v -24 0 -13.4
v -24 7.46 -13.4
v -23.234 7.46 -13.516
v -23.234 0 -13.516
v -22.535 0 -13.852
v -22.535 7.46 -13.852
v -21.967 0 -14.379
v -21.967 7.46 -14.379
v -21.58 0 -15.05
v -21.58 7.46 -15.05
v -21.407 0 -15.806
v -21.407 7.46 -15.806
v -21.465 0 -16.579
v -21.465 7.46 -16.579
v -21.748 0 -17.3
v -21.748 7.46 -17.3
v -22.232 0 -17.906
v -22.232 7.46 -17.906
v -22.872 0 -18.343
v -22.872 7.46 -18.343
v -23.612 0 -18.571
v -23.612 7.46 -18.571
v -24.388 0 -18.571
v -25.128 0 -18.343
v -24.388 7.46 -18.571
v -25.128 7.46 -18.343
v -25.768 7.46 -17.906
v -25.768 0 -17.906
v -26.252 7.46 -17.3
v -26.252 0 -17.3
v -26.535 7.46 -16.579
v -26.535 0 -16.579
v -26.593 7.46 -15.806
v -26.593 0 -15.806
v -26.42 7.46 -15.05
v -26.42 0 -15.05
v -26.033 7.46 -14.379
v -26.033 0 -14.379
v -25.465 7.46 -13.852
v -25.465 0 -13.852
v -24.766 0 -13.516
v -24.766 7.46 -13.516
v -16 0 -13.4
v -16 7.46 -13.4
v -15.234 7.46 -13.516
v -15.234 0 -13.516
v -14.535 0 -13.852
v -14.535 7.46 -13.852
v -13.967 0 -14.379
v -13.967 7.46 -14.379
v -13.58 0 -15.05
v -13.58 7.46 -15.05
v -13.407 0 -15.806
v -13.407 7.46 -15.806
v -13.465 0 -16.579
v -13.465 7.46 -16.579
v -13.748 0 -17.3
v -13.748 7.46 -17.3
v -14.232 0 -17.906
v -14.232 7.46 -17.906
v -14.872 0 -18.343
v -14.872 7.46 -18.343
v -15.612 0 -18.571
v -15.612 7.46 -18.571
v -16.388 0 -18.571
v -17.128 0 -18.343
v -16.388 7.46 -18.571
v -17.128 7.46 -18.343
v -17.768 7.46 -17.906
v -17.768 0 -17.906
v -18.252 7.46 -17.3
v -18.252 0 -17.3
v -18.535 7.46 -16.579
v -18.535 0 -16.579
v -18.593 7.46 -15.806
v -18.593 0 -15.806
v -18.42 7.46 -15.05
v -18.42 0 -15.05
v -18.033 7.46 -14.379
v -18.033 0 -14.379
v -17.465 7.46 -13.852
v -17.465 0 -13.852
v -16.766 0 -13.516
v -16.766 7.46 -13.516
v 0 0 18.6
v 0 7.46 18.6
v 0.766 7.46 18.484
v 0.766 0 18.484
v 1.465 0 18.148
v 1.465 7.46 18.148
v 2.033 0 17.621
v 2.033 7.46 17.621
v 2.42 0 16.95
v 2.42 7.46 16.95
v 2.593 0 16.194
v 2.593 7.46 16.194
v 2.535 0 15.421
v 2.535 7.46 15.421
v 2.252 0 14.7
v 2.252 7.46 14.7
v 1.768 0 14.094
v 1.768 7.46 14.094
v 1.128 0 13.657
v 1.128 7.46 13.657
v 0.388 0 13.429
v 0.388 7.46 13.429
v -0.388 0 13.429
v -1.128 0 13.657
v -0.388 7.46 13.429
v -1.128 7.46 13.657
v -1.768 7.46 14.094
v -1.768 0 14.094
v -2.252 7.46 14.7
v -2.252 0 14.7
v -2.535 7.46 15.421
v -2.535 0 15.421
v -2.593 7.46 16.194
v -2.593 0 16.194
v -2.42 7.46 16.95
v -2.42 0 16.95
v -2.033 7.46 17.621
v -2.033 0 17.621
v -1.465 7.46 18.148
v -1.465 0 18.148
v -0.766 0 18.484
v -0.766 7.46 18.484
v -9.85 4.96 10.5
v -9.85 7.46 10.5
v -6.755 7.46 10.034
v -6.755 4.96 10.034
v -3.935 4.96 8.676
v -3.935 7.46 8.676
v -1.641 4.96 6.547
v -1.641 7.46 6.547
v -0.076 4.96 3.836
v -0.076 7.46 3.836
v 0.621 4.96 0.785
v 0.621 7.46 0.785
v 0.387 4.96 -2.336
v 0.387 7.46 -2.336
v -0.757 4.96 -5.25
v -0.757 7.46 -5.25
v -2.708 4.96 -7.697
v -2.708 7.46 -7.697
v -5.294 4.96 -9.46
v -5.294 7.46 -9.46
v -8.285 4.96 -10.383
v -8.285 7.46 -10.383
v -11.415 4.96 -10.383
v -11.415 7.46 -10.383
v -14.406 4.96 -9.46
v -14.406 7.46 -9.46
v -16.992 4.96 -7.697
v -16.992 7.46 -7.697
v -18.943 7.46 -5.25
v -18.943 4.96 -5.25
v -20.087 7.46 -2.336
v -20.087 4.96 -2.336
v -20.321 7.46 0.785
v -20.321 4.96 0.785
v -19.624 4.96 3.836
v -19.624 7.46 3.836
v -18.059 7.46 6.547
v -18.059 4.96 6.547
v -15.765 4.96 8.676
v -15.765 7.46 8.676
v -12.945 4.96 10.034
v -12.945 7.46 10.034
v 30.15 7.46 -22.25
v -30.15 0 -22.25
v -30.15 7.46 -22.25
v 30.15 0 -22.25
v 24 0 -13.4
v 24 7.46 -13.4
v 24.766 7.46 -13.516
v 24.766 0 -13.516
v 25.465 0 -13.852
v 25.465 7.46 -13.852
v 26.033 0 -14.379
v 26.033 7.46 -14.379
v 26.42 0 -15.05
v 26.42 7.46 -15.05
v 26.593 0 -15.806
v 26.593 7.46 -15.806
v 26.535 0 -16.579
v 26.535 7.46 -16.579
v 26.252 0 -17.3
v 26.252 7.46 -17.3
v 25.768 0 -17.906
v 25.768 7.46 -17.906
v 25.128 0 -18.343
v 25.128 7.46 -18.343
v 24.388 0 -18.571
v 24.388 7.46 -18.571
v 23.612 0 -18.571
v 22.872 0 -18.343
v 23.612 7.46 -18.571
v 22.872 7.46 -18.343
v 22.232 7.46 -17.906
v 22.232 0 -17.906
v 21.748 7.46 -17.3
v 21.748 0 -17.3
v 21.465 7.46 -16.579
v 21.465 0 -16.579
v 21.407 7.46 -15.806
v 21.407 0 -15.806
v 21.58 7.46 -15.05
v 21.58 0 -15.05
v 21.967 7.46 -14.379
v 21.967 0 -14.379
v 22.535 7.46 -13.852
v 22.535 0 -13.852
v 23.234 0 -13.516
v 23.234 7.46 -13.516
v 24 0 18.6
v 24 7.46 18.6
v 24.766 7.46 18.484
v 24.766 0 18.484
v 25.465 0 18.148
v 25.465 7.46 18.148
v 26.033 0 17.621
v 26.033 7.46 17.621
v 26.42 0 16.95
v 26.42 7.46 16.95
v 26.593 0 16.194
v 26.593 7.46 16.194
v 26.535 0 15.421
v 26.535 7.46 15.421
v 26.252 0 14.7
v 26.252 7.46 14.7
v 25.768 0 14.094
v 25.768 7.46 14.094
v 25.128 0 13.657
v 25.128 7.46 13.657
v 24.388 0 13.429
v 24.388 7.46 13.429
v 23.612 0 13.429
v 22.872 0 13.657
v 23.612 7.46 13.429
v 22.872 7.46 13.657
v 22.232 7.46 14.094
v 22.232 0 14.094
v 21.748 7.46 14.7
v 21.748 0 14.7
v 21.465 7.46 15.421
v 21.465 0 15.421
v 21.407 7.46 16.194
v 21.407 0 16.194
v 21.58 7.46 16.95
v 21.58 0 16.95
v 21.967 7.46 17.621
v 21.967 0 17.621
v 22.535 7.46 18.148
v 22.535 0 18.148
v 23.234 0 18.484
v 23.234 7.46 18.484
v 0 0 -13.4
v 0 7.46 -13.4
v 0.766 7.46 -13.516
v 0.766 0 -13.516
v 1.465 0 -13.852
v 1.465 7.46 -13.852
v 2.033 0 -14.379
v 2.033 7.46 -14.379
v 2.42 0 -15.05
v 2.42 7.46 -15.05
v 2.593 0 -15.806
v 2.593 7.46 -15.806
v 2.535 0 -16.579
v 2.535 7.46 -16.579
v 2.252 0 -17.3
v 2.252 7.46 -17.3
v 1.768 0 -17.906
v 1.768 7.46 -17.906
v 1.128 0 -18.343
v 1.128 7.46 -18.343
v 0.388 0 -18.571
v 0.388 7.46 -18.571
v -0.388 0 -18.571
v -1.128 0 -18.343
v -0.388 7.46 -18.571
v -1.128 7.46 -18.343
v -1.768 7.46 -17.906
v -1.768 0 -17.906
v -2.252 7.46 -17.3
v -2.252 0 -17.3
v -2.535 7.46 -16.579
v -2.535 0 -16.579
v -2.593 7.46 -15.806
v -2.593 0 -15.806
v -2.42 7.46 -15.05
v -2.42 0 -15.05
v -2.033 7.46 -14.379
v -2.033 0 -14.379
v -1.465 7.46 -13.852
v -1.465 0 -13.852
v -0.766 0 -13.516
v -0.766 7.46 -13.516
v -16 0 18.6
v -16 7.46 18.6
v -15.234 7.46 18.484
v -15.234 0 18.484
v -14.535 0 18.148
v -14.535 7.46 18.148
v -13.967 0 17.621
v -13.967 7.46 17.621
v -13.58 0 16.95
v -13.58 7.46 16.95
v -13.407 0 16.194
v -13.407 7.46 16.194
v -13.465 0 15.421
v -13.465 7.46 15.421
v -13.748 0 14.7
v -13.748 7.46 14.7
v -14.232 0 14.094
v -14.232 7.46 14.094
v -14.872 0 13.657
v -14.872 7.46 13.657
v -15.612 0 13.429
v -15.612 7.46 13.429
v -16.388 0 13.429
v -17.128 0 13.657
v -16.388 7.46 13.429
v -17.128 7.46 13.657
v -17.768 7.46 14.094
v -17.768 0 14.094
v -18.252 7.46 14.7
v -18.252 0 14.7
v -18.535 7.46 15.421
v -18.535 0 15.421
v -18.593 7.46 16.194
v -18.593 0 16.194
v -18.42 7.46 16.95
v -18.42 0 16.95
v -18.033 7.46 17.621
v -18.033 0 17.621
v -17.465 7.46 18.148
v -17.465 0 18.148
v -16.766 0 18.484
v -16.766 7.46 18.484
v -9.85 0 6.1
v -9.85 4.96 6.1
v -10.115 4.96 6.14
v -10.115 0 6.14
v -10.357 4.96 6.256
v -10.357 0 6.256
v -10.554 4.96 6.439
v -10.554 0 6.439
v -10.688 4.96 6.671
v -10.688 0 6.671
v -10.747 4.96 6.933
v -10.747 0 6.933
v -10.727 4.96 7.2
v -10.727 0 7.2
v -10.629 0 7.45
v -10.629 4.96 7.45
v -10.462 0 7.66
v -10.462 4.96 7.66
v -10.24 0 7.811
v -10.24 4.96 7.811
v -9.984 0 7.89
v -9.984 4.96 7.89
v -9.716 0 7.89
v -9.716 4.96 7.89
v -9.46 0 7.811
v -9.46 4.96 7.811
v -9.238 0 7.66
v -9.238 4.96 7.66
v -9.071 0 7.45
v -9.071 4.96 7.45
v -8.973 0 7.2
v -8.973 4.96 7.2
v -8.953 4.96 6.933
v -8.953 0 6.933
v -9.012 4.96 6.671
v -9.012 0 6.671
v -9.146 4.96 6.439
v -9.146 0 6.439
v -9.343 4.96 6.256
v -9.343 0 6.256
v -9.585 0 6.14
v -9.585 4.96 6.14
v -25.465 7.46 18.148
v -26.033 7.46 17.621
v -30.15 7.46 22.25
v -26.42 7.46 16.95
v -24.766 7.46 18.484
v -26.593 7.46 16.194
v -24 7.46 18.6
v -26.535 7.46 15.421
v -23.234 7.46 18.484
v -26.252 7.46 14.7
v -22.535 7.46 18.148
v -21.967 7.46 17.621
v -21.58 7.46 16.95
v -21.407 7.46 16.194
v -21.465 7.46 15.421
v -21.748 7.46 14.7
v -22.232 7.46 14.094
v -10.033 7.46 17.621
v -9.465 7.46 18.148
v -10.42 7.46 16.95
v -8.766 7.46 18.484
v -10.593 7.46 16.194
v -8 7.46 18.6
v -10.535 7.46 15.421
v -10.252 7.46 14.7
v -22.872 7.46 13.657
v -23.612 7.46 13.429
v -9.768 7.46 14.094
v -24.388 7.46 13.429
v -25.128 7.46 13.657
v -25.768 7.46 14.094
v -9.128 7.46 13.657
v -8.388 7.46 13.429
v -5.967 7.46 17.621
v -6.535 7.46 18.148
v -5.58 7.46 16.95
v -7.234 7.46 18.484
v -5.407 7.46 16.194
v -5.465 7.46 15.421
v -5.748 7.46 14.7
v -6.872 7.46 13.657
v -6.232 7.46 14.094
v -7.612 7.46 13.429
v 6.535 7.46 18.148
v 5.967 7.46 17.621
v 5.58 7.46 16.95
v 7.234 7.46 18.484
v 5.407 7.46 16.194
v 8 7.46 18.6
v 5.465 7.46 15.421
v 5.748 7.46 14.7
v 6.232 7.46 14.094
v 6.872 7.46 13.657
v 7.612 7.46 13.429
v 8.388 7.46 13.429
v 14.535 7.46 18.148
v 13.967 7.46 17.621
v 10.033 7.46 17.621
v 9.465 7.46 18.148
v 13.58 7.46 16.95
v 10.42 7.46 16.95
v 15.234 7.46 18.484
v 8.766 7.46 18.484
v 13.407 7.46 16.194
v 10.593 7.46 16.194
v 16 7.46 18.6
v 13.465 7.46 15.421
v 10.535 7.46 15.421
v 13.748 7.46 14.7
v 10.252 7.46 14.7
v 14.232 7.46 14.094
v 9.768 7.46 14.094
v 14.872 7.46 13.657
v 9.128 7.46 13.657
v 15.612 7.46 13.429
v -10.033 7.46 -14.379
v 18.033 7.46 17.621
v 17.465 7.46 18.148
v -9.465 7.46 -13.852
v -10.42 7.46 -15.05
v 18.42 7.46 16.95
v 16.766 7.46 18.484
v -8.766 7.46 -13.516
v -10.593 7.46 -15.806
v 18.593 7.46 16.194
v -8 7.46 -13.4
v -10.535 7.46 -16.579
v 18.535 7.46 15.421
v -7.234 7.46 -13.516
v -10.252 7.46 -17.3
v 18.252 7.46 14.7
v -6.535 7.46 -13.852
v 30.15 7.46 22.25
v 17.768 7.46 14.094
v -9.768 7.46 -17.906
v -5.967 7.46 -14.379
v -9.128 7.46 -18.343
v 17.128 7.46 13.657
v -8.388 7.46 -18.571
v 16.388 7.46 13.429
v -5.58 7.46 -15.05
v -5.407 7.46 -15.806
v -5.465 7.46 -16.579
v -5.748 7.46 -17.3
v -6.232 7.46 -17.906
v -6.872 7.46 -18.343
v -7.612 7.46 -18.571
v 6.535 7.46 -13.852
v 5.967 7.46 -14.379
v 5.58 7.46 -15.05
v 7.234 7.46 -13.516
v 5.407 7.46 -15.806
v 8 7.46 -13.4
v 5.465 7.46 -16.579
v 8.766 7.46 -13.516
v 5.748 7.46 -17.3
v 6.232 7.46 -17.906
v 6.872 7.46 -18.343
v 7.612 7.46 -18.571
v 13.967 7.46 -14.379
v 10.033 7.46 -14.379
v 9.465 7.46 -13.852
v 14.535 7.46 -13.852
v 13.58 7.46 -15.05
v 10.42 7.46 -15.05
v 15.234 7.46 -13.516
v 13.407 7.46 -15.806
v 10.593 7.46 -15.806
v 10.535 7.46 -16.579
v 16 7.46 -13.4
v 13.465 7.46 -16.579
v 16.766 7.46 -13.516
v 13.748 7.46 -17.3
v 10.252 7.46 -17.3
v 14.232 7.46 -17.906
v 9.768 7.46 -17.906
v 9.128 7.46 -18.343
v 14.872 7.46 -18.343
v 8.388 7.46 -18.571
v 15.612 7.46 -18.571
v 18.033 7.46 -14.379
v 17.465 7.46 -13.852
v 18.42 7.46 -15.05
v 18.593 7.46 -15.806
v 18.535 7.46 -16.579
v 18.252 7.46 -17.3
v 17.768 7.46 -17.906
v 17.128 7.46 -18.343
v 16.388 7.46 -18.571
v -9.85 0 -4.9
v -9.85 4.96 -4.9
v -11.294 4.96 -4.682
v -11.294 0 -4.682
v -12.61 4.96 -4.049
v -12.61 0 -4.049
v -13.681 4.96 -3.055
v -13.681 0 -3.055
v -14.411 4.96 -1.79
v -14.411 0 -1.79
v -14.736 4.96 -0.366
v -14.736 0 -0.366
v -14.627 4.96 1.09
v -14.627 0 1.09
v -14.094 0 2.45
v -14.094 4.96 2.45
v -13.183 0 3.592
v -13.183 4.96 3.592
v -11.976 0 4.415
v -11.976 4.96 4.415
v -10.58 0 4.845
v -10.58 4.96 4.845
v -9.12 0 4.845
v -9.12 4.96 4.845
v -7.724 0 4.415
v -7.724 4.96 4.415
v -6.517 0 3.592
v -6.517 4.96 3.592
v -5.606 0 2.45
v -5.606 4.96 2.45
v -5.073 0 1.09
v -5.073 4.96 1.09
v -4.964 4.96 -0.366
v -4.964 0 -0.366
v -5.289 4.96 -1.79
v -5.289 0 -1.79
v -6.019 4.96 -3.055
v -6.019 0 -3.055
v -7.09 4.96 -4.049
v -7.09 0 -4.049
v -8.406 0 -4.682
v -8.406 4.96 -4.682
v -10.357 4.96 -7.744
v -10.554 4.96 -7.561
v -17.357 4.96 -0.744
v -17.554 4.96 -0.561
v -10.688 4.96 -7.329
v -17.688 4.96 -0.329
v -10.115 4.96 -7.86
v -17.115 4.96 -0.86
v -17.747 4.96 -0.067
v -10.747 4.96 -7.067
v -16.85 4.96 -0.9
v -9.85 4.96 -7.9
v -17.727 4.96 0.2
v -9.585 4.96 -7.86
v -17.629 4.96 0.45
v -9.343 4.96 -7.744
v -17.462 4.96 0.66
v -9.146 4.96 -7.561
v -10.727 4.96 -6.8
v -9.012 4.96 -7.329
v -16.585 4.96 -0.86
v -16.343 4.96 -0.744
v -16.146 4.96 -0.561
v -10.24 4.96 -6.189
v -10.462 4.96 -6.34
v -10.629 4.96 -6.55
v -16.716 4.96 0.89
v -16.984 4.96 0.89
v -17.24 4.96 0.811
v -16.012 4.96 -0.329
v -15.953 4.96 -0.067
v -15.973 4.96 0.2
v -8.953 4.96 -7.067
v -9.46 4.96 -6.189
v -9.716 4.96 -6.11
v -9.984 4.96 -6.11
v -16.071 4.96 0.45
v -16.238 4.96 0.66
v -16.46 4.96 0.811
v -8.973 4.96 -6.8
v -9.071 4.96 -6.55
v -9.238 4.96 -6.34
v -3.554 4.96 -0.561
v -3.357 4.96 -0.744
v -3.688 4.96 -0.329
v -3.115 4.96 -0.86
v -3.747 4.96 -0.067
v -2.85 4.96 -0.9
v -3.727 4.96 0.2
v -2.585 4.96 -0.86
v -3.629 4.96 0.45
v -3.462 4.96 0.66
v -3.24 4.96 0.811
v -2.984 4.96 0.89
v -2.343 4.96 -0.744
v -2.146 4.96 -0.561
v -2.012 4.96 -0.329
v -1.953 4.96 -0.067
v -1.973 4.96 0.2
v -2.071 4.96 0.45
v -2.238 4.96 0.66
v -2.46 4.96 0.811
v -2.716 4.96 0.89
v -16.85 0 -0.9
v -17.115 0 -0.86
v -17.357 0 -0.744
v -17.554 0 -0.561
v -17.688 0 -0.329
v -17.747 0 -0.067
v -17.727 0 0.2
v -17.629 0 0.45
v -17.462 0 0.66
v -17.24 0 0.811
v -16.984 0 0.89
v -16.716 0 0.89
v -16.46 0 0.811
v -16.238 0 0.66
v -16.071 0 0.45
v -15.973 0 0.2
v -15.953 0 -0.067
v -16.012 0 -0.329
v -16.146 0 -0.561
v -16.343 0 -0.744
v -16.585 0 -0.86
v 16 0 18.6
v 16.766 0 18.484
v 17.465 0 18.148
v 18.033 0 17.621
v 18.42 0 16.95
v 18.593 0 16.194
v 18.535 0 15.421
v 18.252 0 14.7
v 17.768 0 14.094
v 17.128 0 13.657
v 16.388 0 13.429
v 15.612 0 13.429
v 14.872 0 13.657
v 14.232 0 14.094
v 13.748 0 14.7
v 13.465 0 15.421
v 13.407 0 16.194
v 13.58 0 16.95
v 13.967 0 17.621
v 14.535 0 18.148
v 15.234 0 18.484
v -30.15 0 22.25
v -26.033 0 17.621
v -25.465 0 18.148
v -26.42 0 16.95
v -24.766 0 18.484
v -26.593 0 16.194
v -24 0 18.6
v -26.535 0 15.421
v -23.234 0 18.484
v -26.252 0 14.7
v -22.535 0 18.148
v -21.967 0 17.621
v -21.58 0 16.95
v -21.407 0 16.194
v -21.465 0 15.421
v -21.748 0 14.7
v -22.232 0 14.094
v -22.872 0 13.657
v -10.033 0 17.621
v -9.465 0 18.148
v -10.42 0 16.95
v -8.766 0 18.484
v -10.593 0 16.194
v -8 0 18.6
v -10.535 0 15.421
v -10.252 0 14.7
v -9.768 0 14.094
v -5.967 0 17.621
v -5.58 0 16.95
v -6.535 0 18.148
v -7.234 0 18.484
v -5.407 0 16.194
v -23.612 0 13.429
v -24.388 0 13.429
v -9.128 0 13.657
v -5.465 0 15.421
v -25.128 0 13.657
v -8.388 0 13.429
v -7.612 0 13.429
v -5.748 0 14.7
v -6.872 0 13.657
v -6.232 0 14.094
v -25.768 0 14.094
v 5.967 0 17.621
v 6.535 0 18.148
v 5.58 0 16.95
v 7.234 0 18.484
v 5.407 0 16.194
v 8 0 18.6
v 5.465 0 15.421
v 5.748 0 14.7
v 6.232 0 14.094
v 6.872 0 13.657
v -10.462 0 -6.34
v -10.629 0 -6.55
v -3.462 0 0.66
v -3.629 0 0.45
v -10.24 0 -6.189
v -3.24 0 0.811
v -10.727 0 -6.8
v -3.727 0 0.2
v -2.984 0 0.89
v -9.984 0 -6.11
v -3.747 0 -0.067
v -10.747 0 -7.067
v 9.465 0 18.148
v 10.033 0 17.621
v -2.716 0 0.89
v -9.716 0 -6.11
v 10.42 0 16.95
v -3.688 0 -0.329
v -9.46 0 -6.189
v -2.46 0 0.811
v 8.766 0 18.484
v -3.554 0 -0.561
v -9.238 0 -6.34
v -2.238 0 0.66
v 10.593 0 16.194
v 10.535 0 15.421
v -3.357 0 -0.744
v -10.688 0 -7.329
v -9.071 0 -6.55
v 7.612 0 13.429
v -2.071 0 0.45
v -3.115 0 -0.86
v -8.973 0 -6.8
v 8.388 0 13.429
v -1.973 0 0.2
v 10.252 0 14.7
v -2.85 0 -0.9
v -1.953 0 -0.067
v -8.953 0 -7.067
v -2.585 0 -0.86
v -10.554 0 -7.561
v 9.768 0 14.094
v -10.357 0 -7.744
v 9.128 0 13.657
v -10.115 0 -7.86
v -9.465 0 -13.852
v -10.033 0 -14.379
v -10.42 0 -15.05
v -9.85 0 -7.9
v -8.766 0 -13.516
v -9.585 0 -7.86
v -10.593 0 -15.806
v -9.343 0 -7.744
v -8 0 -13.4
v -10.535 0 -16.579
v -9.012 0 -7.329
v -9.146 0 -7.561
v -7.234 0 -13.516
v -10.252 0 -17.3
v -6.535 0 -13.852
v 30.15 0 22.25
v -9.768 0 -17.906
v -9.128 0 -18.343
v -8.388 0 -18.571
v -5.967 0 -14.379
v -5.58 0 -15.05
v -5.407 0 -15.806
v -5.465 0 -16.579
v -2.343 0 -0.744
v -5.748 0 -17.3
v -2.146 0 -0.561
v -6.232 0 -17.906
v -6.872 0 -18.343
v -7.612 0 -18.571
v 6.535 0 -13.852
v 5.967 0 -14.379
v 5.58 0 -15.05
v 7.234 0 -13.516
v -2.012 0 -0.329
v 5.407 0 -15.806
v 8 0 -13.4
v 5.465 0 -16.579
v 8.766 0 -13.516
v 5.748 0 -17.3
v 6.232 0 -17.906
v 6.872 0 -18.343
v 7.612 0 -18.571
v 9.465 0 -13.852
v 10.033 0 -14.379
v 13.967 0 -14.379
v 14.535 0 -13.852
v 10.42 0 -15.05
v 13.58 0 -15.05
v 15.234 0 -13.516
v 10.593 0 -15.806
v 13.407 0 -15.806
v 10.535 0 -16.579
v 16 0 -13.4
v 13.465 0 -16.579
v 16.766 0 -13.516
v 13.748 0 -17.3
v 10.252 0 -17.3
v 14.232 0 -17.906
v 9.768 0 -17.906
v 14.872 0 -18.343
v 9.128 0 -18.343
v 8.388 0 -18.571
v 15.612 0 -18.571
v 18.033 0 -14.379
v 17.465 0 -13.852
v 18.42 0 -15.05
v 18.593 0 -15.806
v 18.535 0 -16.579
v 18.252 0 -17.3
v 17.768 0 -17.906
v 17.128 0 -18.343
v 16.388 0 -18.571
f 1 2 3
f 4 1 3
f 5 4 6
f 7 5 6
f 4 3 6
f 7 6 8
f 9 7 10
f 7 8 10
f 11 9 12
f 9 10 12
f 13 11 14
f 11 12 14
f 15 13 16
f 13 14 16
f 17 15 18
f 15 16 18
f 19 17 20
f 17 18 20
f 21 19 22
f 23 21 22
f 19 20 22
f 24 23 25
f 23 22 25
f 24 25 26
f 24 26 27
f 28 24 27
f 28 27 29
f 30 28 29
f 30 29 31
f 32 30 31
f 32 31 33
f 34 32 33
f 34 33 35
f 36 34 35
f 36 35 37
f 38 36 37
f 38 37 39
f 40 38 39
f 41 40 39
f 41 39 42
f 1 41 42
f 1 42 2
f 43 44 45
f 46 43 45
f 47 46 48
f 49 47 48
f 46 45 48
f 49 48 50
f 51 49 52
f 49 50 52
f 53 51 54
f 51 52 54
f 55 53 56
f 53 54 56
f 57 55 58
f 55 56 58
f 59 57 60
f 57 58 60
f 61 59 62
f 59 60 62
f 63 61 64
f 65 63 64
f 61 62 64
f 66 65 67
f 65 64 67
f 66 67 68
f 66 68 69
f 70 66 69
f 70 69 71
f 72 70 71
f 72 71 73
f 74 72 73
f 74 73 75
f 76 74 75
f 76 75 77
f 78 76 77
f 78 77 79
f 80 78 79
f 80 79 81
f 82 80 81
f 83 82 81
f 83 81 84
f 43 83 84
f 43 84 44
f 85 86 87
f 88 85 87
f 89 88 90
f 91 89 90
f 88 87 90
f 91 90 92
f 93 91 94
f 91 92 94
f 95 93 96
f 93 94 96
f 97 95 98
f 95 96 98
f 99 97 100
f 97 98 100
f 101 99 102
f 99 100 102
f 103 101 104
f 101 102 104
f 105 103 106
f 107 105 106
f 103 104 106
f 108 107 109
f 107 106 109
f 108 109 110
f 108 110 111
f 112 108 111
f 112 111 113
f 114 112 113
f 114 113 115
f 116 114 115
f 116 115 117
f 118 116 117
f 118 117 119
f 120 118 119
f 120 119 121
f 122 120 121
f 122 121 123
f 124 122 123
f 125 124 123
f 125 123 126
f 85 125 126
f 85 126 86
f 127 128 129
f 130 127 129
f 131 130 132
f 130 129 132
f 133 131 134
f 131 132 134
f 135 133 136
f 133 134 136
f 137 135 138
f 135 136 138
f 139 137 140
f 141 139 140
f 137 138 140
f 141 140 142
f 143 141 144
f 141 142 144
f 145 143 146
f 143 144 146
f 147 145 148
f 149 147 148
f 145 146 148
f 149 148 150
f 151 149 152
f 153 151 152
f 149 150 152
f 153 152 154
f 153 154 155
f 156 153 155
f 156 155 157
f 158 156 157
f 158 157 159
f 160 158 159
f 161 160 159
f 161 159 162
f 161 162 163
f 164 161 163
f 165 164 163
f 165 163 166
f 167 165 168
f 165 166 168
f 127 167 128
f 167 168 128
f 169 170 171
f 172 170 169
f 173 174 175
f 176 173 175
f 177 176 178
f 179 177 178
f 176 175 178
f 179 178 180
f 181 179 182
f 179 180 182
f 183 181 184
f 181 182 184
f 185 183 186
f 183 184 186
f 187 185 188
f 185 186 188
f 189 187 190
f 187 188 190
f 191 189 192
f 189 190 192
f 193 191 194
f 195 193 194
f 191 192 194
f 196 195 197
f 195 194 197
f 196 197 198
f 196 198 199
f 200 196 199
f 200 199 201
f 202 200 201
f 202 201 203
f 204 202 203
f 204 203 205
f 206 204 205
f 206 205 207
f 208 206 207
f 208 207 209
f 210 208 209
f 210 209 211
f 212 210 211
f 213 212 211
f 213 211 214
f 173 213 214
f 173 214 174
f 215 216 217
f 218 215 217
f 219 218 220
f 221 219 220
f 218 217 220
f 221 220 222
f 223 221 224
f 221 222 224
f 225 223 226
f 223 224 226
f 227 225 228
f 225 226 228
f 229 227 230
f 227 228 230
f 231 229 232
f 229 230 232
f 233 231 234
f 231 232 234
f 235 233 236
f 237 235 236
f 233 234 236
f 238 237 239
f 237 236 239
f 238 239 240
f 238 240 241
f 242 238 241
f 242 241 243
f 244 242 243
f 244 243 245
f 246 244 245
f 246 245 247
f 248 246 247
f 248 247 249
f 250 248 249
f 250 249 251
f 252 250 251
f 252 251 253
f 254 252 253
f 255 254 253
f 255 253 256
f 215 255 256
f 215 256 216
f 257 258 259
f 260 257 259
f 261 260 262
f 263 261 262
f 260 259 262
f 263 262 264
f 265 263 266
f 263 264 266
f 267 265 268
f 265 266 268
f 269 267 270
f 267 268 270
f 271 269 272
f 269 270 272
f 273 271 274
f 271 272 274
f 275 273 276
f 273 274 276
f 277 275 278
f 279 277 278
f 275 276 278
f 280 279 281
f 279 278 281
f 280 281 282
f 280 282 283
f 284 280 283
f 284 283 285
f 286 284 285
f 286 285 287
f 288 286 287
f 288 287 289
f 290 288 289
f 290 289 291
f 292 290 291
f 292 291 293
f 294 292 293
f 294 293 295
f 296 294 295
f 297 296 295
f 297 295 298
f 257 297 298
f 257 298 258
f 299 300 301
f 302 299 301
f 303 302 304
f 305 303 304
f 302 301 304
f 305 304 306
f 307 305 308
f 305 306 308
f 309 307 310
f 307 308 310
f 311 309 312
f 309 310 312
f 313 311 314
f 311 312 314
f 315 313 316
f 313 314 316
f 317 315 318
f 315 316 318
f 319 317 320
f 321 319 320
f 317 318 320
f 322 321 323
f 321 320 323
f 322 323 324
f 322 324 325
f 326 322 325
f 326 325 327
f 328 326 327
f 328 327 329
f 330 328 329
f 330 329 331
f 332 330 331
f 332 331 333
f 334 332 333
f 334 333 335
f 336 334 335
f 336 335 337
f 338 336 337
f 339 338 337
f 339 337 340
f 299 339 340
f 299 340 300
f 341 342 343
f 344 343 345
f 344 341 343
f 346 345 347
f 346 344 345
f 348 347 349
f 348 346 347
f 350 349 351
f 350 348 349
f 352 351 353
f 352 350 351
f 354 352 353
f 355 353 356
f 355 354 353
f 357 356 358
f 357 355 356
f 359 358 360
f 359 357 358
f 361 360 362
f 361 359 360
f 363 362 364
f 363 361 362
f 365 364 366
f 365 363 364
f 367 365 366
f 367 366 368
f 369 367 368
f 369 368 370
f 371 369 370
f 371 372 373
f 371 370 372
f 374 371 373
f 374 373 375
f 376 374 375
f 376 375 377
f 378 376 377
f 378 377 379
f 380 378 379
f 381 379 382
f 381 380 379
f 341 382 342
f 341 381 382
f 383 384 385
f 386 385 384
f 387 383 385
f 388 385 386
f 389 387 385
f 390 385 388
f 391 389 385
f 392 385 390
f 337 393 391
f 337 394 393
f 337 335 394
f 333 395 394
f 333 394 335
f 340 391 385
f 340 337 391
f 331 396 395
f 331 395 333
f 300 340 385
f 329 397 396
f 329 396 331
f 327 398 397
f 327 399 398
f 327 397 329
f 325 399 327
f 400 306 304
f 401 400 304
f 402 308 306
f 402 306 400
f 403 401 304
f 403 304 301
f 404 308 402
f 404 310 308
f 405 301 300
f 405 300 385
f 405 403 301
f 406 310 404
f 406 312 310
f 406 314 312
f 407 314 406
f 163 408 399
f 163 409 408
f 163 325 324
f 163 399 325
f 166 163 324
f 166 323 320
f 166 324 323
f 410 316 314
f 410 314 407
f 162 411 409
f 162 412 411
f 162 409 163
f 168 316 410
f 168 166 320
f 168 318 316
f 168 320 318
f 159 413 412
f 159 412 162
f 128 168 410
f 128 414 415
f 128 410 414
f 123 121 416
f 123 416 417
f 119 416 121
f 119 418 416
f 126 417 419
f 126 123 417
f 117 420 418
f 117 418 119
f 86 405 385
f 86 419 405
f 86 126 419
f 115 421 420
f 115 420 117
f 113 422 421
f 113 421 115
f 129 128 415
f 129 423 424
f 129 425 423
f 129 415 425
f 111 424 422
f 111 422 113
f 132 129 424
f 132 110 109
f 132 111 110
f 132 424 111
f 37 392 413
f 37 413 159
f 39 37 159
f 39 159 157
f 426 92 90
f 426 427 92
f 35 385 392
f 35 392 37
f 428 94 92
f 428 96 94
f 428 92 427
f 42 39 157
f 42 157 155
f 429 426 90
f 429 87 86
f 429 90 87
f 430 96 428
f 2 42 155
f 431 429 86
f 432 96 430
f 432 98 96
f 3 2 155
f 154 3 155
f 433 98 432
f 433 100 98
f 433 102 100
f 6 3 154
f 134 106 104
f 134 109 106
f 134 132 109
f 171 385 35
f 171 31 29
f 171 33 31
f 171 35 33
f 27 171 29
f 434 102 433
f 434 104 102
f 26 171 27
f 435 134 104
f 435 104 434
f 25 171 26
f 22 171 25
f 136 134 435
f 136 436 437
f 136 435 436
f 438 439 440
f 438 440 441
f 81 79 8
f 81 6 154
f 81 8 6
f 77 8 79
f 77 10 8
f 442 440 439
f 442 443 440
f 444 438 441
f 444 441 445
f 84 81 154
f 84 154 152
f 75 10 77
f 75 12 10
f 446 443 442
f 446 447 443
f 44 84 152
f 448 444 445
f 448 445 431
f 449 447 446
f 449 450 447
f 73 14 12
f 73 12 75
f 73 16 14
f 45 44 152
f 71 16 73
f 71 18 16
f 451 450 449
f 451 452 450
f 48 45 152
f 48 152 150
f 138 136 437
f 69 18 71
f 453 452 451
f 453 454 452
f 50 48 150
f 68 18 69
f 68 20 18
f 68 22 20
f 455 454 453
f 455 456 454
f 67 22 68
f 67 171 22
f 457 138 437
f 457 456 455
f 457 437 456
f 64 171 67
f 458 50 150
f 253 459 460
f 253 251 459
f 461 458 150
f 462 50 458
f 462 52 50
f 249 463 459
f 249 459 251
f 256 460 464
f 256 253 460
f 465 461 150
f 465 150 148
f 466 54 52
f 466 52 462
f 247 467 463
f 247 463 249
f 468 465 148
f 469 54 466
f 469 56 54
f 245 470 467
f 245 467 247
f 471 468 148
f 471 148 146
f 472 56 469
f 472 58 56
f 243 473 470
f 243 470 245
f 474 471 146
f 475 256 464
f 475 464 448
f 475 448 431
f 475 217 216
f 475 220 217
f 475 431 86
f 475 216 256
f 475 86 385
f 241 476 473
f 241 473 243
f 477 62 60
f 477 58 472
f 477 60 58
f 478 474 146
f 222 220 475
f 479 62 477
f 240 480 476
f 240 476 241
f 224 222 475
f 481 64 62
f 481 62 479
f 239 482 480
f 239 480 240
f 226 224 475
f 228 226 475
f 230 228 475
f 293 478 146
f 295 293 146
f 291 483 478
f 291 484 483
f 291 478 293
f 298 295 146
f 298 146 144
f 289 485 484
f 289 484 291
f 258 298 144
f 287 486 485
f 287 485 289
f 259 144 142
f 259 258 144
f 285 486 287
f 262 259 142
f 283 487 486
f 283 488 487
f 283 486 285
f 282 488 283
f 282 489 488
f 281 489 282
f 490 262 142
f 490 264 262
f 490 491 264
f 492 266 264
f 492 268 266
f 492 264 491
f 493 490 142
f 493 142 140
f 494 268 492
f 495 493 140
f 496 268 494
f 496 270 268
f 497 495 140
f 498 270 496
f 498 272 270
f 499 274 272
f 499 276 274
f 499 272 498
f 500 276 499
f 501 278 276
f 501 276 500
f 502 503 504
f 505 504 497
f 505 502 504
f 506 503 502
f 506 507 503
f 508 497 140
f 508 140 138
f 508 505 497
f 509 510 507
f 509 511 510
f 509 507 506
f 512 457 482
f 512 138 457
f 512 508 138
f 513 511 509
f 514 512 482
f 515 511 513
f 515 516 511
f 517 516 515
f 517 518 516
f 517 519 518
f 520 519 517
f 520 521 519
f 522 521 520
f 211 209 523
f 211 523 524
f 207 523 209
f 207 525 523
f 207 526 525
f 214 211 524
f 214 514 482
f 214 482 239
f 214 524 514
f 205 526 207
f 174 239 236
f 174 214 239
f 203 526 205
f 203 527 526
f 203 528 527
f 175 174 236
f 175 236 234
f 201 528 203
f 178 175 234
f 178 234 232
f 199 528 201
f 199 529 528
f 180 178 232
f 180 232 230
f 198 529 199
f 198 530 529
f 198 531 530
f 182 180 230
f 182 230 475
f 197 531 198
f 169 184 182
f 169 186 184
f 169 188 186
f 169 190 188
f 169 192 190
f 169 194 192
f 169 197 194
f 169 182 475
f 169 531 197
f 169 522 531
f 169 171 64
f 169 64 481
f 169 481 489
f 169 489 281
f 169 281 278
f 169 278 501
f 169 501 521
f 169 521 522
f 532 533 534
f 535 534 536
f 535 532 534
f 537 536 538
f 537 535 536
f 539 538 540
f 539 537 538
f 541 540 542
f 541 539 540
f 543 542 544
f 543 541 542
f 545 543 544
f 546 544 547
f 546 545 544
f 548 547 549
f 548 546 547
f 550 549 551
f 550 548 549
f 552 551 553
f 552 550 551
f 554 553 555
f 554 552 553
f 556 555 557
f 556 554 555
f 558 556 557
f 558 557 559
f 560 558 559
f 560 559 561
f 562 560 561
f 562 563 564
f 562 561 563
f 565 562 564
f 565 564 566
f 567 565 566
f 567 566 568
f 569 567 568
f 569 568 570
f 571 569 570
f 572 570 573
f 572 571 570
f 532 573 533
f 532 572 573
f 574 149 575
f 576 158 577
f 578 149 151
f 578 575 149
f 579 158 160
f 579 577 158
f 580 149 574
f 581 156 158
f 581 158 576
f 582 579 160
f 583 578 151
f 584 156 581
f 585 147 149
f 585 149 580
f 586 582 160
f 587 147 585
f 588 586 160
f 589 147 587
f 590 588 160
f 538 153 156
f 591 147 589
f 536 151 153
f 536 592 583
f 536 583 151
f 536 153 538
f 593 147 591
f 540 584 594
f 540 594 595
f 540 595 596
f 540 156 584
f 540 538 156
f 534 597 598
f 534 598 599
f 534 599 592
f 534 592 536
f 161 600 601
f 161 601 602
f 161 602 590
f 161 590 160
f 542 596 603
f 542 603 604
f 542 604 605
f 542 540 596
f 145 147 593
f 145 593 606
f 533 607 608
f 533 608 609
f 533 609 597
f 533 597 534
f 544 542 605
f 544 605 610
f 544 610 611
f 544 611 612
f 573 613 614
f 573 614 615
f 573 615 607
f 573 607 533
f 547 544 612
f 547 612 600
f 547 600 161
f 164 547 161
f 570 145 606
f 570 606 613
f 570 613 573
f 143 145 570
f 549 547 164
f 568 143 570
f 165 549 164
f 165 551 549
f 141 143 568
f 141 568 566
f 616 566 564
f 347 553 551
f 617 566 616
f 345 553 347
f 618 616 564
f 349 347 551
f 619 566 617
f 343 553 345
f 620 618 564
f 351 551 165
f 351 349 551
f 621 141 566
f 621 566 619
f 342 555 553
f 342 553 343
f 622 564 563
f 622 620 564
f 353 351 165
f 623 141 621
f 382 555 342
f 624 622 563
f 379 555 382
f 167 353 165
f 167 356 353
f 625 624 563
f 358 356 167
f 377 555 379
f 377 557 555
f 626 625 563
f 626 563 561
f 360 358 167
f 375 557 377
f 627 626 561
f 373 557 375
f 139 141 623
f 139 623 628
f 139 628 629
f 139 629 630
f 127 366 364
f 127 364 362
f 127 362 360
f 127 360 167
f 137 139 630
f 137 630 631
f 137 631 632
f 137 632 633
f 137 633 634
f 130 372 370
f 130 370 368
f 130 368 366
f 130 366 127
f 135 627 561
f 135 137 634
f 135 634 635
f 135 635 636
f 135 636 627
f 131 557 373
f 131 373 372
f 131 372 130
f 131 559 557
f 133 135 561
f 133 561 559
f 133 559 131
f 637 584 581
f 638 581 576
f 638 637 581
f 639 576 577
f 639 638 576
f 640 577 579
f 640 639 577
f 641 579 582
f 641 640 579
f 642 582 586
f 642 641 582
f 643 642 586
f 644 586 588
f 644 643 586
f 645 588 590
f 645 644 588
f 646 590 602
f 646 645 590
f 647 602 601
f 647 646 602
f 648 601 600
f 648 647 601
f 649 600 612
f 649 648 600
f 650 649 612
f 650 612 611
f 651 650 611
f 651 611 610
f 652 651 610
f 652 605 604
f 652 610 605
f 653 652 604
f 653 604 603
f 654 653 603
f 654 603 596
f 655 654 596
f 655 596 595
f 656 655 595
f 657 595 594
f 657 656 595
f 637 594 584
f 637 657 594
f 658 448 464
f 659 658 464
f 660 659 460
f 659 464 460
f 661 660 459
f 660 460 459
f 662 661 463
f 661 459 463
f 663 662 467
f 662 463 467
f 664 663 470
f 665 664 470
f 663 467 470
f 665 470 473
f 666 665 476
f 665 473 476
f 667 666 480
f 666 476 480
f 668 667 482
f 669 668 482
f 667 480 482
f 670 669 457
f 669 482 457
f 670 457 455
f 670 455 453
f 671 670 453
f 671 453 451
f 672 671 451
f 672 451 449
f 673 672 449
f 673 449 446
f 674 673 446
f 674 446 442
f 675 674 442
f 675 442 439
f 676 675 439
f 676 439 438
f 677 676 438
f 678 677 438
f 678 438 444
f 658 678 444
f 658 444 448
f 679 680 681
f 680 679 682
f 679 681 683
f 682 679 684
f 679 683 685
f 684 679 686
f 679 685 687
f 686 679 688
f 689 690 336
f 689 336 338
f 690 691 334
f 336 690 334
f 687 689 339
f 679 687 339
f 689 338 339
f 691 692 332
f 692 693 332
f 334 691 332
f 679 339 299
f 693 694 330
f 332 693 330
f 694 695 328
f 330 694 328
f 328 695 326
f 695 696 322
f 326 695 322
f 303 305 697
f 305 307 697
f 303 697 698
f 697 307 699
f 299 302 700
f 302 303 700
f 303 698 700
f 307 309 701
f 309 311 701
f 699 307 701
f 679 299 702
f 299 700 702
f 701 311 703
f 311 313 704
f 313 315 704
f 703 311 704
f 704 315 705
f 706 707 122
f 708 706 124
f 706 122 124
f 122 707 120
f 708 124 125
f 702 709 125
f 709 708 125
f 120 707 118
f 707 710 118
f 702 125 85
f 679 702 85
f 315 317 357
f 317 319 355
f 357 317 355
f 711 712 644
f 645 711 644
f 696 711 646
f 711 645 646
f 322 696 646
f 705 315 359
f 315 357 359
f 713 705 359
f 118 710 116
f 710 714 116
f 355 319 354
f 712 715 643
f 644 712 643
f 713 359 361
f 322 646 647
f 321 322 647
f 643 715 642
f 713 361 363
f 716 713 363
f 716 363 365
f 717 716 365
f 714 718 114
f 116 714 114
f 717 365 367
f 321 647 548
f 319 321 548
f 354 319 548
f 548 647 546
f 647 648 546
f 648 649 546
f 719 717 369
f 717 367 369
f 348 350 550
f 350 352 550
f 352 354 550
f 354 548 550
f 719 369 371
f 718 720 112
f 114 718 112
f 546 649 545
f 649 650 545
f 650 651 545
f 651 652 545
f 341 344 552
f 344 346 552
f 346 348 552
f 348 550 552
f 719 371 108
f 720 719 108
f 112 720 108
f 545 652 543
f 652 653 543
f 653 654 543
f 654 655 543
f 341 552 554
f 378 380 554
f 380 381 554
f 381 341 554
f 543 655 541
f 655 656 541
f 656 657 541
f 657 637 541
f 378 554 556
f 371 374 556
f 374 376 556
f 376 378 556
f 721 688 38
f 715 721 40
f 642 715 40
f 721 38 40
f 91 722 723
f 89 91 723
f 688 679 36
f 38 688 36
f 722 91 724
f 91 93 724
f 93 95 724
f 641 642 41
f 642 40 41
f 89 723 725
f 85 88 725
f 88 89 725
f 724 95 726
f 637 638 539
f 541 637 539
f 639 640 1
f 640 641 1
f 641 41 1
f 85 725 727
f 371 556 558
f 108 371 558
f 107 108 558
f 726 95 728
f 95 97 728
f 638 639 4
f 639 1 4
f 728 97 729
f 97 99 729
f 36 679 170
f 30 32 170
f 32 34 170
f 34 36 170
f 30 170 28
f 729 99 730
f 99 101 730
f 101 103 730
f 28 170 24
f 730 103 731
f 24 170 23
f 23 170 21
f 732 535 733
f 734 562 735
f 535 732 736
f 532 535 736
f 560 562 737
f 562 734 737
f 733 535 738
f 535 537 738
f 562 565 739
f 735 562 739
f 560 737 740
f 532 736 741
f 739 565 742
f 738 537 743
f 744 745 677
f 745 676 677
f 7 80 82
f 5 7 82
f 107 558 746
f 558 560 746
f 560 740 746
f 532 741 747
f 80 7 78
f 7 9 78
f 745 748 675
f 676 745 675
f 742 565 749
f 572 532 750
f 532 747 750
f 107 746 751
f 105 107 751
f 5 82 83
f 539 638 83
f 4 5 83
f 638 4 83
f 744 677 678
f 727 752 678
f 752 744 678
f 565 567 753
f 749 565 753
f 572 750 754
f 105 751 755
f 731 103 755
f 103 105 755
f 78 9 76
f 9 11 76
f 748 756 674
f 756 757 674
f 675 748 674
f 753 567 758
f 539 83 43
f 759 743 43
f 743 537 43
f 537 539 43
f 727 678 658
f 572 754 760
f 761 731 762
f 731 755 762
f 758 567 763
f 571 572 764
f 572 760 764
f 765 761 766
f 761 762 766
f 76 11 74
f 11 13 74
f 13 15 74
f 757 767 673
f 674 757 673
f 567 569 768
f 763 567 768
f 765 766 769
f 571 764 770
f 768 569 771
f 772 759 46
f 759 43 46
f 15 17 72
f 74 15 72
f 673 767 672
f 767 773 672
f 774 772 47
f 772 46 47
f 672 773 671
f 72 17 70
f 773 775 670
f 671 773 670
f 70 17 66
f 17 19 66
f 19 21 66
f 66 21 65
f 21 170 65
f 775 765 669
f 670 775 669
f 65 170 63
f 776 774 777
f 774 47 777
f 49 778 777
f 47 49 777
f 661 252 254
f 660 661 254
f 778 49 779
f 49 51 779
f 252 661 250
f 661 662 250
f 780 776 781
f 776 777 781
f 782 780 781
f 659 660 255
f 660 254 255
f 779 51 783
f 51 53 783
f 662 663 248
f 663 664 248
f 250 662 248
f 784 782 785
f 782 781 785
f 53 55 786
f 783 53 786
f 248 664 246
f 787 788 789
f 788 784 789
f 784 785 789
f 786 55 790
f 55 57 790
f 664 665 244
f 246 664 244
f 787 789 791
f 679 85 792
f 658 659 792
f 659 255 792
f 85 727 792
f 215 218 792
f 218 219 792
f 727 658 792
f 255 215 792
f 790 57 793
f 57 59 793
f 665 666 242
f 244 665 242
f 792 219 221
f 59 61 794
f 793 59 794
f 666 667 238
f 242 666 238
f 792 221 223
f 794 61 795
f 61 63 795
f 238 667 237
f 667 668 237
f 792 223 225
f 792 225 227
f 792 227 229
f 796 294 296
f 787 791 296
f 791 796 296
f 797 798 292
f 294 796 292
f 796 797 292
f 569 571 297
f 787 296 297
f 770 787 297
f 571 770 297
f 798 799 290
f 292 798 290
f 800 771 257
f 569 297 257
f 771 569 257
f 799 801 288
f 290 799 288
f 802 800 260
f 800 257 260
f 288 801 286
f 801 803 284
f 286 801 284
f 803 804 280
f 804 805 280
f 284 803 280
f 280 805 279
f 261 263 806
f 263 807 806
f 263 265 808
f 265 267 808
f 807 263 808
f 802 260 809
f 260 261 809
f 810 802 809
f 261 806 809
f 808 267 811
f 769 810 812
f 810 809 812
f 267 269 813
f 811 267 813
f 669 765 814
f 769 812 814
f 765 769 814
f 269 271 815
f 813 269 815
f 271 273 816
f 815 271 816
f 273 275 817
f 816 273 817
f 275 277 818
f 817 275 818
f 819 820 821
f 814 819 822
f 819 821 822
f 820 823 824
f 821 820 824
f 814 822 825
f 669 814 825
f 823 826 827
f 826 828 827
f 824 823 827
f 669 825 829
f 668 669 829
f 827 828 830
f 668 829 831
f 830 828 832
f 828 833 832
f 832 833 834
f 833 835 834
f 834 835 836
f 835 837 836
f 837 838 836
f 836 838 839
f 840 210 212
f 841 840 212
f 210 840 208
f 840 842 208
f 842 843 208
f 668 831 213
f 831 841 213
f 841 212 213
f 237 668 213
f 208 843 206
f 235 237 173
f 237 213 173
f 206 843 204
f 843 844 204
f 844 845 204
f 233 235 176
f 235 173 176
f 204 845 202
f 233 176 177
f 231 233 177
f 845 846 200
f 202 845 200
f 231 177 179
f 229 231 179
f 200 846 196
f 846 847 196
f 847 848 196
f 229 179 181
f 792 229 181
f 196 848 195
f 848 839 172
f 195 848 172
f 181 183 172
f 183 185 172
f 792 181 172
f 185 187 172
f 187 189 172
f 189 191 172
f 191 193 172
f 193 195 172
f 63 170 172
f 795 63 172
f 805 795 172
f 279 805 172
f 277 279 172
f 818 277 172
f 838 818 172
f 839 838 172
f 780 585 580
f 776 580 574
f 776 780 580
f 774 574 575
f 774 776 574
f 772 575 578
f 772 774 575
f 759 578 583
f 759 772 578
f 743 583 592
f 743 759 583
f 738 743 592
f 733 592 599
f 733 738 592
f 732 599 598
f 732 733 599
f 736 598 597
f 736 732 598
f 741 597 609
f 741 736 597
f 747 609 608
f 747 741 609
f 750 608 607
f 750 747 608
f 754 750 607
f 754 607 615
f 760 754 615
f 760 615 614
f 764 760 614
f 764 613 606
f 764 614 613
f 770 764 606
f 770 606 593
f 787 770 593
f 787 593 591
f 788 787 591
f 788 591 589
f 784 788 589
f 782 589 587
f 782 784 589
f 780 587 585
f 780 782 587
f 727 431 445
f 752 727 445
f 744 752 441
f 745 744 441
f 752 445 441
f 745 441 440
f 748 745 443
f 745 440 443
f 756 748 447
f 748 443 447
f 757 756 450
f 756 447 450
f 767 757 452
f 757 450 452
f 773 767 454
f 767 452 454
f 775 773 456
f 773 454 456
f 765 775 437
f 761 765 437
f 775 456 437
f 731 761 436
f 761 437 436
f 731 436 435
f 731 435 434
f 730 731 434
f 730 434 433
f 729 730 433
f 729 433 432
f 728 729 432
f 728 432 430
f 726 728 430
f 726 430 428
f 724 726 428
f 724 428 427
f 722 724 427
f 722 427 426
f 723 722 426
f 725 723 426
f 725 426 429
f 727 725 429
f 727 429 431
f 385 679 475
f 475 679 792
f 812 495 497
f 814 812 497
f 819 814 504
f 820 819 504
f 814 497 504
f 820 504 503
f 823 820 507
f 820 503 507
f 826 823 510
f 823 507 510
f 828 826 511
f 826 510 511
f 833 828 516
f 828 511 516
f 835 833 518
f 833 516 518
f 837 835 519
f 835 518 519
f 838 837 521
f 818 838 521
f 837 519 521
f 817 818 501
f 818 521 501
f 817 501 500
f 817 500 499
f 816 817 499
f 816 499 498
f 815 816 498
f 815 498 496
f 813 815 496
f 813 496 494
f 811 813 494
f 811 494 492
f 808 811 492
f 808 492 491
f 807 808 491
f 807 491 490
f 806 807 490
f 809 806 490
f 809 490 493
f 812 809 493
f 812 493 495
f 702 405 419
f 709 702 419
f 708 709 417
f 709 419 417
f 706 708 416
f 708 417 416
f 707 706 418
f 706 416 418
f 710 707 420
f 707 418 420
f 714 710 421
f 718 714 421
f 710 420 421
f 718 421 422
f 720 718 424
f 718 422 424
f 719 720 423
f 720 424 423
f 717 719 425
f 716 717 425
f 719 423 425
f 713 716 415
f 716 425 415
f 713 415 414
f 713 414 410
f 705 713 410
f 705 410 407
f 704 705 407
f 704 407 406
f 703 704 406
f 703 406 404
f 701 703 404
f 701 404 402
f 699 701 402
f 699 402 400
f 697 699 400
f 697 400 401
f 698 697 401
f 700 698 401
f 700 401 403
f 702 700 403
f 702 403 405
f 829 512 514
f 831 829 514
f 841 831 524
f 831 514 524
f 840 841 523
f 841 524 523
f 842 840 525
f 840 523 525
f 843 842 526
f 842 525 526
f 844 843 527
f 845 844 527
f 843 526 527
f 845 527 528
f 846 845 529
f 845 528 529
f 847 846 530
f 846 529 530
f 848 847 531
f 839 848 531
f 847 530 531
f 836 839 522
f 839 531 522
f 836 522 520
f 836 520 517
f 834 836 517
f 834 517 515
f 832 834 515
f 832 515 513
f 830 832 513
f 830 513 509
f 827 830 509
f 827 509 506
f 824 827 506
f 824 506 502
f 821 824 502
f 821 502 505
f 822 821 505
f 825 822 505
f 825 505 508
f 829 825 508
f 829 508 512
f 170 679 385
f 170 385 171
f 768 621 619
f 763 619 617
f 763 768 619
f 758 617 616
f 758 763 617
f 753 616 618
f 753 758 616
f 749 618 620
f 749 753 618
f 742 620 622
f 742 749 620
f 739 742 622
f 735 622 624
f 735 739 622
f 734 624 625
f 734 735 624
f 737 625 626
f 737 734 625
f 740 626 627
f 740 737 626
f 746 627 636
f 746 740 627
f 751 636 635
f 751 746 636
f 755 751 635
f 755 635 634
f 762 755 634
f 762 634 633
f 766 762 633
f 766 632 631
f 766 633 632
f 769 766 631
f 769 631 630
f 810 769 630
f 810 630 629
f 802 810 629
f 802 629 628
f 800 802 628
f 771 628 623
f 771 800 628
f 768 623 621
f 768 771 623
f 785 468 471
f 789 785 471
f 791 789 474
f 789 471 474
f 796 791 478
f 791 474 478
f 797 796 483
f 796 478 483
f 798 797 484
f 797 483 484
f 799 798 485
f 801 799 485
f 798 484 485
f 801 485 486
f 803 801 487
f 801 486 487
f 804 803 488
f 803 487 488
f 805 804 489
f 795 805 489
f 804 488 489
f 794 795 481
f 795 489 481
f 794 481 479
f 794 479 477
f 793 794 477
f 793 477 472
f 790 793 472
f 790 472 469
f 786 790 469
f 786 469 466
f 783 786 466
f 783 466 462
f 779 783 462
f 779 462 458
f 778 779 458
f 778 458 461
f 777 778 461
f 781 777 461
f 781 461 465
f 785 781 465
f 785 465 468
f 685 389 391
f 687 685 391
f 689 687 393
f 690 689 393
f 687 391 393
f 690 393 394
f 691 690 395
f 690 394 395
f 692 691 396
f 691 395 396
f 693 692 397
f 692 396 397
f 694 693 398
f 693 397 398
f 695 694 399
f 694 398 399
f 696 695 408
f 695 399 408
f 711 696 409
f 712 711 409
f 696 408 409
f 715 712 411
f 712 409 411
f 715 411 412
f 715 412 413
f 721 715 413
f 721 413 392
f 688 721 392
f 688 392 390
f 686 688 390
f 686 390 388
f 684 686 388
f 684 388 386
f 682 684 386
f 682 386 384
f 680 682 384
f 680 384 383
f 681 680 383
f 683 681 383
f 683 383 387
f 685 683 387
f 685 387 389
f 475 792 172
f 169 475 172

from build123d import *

# Parameters (mm, degrees)
SKETCH3_W           = 60.3
SKETCH3_H           = 44.5
SKETCH3_R           = 0.9
SKETCH3_R_2         = 4.9
BOSS_EXTRUDE1_DEPTH = 7.46
SKETCH4_R           = 10.5
CUT_EXTRUDE1_DEPTH  = 2.5
SKETCH5_R           = 2.6
CUT_EXTRUDE2_DEPTH  = 39.206499447


with BuildPart() as part:
    # Sketch3 → Boss-Extrude1 (new body)
    with BuildSketch(Plane(origin=(0, 0, 0), x_dir=(1, 0, 0), z_dir=(0, 1, 0))):
        Rectangle(SKETCH3_W, SKETCH3_H)
        with Locations(Location((-9.85, 7, 0), (0, 0, 90))):
            Circle(SKETCH3_R, mode=Mode.SUBTRACT)
        with Locations(Location((-16.85, 0, 0), (0, 0, 90))):
            Circle(SKETCH3_R, mode=Mode.SUBTRACT)
        with Locations(Location((-9.85, -7, 0), (0, 0, 90))):
            Circle(SKETCH3_R, mode=Mode.SUBTRACT)
        with Locations(Location((-2.85, 0, 0), (0, 0, 90))):
            Circle(SKETCH3_R, mode=Mode.SUBTRACT)
        with Locations(Location((-9.85, 0, 0), (0, 0, 90))):
            Circle(SKETCH3_R_2, mode=Mode.SUBTRACT)
    extrude(amount=BOSS_EXTRUDE1_DEPTH)

    # Sketch4 → Cut-Extrude1 (cut)
    with BuildSketch(Plane(origin=(0, 7.46, 0), x_dir=(1, 0, 0), z_dir=(0, 1, 0))):
        with Locations(Location((-9.85, 0, 0), (0, 0, 270))):
            Circle(SKETCH4_R)
    extrude(amount=-CUT_EXTRUDE1_DEPTH, mode=Mode.SUBTRACT)

    # Sketch5 → Cut-Extrude2 (cut, through all)
    with BuildSketch(Plane(origin=(0, 7.46, 0), x_dir=(1, 0, 0), z_dir=(0, 1, 0))):
        with Locations(Location((0, 16, 0), (0, 0, 270))):
            Circle(SKETCH5_R)
        with Locations(Location((8, 16, 0), (0, 0, 270))):
            Circle(SKETCH5_R)
        with Locations(Location((16, 16, 0), (0, 0, 270))):
            Circle(SKETCH5_R)
        with Locations(Location((24, 16, 0), (0, 0, 270))):
            Circle(SKETCH5_R)
        with Locations(Location((-24, 16, 0), (0, 0, 270))):
            Circle(SKETCH5_R)
        with Locations(Location((-16, 16, 0), (0, 0, 270))):
            Circle(SKETCH5_R)
        with Locations(Location((-8, 16, 0), (0, 0, 270))):
            Circle(SKETCH5_R)
        with Locations(Location((-8, -16, 0), (0, 0, 270))):
            Circle(SKETCH5_R)
        with Locations(Location((-16, -16, 0), (0, 0, 270))):
            Circle(SKETCH5_R)
        with Locations(Location((-24, -16, 0), (0, 0, 270))):
            Circle(SKETCH5_R)
        with Locations(Location((24, -16, 0), (0, 0, 270))):
            Circle(SKETCH5_R)
        with Locations(Location((16, -16, 0), (0, 0, 270))):
            Circle(SKETCH5_R)
        with Locations(Location((8, -16, 0), (0, 0, 270))):
            Circle(SKETCH5_R)
        with Locations(Location((0, -16, 0), (0, 0, 270))):
            Circle(SKETCH5_R)
    extrude(amount=-CUT_EXTRUDE2_DEPTH, mode=Mode.SUBTRACT)


solid = part.part
